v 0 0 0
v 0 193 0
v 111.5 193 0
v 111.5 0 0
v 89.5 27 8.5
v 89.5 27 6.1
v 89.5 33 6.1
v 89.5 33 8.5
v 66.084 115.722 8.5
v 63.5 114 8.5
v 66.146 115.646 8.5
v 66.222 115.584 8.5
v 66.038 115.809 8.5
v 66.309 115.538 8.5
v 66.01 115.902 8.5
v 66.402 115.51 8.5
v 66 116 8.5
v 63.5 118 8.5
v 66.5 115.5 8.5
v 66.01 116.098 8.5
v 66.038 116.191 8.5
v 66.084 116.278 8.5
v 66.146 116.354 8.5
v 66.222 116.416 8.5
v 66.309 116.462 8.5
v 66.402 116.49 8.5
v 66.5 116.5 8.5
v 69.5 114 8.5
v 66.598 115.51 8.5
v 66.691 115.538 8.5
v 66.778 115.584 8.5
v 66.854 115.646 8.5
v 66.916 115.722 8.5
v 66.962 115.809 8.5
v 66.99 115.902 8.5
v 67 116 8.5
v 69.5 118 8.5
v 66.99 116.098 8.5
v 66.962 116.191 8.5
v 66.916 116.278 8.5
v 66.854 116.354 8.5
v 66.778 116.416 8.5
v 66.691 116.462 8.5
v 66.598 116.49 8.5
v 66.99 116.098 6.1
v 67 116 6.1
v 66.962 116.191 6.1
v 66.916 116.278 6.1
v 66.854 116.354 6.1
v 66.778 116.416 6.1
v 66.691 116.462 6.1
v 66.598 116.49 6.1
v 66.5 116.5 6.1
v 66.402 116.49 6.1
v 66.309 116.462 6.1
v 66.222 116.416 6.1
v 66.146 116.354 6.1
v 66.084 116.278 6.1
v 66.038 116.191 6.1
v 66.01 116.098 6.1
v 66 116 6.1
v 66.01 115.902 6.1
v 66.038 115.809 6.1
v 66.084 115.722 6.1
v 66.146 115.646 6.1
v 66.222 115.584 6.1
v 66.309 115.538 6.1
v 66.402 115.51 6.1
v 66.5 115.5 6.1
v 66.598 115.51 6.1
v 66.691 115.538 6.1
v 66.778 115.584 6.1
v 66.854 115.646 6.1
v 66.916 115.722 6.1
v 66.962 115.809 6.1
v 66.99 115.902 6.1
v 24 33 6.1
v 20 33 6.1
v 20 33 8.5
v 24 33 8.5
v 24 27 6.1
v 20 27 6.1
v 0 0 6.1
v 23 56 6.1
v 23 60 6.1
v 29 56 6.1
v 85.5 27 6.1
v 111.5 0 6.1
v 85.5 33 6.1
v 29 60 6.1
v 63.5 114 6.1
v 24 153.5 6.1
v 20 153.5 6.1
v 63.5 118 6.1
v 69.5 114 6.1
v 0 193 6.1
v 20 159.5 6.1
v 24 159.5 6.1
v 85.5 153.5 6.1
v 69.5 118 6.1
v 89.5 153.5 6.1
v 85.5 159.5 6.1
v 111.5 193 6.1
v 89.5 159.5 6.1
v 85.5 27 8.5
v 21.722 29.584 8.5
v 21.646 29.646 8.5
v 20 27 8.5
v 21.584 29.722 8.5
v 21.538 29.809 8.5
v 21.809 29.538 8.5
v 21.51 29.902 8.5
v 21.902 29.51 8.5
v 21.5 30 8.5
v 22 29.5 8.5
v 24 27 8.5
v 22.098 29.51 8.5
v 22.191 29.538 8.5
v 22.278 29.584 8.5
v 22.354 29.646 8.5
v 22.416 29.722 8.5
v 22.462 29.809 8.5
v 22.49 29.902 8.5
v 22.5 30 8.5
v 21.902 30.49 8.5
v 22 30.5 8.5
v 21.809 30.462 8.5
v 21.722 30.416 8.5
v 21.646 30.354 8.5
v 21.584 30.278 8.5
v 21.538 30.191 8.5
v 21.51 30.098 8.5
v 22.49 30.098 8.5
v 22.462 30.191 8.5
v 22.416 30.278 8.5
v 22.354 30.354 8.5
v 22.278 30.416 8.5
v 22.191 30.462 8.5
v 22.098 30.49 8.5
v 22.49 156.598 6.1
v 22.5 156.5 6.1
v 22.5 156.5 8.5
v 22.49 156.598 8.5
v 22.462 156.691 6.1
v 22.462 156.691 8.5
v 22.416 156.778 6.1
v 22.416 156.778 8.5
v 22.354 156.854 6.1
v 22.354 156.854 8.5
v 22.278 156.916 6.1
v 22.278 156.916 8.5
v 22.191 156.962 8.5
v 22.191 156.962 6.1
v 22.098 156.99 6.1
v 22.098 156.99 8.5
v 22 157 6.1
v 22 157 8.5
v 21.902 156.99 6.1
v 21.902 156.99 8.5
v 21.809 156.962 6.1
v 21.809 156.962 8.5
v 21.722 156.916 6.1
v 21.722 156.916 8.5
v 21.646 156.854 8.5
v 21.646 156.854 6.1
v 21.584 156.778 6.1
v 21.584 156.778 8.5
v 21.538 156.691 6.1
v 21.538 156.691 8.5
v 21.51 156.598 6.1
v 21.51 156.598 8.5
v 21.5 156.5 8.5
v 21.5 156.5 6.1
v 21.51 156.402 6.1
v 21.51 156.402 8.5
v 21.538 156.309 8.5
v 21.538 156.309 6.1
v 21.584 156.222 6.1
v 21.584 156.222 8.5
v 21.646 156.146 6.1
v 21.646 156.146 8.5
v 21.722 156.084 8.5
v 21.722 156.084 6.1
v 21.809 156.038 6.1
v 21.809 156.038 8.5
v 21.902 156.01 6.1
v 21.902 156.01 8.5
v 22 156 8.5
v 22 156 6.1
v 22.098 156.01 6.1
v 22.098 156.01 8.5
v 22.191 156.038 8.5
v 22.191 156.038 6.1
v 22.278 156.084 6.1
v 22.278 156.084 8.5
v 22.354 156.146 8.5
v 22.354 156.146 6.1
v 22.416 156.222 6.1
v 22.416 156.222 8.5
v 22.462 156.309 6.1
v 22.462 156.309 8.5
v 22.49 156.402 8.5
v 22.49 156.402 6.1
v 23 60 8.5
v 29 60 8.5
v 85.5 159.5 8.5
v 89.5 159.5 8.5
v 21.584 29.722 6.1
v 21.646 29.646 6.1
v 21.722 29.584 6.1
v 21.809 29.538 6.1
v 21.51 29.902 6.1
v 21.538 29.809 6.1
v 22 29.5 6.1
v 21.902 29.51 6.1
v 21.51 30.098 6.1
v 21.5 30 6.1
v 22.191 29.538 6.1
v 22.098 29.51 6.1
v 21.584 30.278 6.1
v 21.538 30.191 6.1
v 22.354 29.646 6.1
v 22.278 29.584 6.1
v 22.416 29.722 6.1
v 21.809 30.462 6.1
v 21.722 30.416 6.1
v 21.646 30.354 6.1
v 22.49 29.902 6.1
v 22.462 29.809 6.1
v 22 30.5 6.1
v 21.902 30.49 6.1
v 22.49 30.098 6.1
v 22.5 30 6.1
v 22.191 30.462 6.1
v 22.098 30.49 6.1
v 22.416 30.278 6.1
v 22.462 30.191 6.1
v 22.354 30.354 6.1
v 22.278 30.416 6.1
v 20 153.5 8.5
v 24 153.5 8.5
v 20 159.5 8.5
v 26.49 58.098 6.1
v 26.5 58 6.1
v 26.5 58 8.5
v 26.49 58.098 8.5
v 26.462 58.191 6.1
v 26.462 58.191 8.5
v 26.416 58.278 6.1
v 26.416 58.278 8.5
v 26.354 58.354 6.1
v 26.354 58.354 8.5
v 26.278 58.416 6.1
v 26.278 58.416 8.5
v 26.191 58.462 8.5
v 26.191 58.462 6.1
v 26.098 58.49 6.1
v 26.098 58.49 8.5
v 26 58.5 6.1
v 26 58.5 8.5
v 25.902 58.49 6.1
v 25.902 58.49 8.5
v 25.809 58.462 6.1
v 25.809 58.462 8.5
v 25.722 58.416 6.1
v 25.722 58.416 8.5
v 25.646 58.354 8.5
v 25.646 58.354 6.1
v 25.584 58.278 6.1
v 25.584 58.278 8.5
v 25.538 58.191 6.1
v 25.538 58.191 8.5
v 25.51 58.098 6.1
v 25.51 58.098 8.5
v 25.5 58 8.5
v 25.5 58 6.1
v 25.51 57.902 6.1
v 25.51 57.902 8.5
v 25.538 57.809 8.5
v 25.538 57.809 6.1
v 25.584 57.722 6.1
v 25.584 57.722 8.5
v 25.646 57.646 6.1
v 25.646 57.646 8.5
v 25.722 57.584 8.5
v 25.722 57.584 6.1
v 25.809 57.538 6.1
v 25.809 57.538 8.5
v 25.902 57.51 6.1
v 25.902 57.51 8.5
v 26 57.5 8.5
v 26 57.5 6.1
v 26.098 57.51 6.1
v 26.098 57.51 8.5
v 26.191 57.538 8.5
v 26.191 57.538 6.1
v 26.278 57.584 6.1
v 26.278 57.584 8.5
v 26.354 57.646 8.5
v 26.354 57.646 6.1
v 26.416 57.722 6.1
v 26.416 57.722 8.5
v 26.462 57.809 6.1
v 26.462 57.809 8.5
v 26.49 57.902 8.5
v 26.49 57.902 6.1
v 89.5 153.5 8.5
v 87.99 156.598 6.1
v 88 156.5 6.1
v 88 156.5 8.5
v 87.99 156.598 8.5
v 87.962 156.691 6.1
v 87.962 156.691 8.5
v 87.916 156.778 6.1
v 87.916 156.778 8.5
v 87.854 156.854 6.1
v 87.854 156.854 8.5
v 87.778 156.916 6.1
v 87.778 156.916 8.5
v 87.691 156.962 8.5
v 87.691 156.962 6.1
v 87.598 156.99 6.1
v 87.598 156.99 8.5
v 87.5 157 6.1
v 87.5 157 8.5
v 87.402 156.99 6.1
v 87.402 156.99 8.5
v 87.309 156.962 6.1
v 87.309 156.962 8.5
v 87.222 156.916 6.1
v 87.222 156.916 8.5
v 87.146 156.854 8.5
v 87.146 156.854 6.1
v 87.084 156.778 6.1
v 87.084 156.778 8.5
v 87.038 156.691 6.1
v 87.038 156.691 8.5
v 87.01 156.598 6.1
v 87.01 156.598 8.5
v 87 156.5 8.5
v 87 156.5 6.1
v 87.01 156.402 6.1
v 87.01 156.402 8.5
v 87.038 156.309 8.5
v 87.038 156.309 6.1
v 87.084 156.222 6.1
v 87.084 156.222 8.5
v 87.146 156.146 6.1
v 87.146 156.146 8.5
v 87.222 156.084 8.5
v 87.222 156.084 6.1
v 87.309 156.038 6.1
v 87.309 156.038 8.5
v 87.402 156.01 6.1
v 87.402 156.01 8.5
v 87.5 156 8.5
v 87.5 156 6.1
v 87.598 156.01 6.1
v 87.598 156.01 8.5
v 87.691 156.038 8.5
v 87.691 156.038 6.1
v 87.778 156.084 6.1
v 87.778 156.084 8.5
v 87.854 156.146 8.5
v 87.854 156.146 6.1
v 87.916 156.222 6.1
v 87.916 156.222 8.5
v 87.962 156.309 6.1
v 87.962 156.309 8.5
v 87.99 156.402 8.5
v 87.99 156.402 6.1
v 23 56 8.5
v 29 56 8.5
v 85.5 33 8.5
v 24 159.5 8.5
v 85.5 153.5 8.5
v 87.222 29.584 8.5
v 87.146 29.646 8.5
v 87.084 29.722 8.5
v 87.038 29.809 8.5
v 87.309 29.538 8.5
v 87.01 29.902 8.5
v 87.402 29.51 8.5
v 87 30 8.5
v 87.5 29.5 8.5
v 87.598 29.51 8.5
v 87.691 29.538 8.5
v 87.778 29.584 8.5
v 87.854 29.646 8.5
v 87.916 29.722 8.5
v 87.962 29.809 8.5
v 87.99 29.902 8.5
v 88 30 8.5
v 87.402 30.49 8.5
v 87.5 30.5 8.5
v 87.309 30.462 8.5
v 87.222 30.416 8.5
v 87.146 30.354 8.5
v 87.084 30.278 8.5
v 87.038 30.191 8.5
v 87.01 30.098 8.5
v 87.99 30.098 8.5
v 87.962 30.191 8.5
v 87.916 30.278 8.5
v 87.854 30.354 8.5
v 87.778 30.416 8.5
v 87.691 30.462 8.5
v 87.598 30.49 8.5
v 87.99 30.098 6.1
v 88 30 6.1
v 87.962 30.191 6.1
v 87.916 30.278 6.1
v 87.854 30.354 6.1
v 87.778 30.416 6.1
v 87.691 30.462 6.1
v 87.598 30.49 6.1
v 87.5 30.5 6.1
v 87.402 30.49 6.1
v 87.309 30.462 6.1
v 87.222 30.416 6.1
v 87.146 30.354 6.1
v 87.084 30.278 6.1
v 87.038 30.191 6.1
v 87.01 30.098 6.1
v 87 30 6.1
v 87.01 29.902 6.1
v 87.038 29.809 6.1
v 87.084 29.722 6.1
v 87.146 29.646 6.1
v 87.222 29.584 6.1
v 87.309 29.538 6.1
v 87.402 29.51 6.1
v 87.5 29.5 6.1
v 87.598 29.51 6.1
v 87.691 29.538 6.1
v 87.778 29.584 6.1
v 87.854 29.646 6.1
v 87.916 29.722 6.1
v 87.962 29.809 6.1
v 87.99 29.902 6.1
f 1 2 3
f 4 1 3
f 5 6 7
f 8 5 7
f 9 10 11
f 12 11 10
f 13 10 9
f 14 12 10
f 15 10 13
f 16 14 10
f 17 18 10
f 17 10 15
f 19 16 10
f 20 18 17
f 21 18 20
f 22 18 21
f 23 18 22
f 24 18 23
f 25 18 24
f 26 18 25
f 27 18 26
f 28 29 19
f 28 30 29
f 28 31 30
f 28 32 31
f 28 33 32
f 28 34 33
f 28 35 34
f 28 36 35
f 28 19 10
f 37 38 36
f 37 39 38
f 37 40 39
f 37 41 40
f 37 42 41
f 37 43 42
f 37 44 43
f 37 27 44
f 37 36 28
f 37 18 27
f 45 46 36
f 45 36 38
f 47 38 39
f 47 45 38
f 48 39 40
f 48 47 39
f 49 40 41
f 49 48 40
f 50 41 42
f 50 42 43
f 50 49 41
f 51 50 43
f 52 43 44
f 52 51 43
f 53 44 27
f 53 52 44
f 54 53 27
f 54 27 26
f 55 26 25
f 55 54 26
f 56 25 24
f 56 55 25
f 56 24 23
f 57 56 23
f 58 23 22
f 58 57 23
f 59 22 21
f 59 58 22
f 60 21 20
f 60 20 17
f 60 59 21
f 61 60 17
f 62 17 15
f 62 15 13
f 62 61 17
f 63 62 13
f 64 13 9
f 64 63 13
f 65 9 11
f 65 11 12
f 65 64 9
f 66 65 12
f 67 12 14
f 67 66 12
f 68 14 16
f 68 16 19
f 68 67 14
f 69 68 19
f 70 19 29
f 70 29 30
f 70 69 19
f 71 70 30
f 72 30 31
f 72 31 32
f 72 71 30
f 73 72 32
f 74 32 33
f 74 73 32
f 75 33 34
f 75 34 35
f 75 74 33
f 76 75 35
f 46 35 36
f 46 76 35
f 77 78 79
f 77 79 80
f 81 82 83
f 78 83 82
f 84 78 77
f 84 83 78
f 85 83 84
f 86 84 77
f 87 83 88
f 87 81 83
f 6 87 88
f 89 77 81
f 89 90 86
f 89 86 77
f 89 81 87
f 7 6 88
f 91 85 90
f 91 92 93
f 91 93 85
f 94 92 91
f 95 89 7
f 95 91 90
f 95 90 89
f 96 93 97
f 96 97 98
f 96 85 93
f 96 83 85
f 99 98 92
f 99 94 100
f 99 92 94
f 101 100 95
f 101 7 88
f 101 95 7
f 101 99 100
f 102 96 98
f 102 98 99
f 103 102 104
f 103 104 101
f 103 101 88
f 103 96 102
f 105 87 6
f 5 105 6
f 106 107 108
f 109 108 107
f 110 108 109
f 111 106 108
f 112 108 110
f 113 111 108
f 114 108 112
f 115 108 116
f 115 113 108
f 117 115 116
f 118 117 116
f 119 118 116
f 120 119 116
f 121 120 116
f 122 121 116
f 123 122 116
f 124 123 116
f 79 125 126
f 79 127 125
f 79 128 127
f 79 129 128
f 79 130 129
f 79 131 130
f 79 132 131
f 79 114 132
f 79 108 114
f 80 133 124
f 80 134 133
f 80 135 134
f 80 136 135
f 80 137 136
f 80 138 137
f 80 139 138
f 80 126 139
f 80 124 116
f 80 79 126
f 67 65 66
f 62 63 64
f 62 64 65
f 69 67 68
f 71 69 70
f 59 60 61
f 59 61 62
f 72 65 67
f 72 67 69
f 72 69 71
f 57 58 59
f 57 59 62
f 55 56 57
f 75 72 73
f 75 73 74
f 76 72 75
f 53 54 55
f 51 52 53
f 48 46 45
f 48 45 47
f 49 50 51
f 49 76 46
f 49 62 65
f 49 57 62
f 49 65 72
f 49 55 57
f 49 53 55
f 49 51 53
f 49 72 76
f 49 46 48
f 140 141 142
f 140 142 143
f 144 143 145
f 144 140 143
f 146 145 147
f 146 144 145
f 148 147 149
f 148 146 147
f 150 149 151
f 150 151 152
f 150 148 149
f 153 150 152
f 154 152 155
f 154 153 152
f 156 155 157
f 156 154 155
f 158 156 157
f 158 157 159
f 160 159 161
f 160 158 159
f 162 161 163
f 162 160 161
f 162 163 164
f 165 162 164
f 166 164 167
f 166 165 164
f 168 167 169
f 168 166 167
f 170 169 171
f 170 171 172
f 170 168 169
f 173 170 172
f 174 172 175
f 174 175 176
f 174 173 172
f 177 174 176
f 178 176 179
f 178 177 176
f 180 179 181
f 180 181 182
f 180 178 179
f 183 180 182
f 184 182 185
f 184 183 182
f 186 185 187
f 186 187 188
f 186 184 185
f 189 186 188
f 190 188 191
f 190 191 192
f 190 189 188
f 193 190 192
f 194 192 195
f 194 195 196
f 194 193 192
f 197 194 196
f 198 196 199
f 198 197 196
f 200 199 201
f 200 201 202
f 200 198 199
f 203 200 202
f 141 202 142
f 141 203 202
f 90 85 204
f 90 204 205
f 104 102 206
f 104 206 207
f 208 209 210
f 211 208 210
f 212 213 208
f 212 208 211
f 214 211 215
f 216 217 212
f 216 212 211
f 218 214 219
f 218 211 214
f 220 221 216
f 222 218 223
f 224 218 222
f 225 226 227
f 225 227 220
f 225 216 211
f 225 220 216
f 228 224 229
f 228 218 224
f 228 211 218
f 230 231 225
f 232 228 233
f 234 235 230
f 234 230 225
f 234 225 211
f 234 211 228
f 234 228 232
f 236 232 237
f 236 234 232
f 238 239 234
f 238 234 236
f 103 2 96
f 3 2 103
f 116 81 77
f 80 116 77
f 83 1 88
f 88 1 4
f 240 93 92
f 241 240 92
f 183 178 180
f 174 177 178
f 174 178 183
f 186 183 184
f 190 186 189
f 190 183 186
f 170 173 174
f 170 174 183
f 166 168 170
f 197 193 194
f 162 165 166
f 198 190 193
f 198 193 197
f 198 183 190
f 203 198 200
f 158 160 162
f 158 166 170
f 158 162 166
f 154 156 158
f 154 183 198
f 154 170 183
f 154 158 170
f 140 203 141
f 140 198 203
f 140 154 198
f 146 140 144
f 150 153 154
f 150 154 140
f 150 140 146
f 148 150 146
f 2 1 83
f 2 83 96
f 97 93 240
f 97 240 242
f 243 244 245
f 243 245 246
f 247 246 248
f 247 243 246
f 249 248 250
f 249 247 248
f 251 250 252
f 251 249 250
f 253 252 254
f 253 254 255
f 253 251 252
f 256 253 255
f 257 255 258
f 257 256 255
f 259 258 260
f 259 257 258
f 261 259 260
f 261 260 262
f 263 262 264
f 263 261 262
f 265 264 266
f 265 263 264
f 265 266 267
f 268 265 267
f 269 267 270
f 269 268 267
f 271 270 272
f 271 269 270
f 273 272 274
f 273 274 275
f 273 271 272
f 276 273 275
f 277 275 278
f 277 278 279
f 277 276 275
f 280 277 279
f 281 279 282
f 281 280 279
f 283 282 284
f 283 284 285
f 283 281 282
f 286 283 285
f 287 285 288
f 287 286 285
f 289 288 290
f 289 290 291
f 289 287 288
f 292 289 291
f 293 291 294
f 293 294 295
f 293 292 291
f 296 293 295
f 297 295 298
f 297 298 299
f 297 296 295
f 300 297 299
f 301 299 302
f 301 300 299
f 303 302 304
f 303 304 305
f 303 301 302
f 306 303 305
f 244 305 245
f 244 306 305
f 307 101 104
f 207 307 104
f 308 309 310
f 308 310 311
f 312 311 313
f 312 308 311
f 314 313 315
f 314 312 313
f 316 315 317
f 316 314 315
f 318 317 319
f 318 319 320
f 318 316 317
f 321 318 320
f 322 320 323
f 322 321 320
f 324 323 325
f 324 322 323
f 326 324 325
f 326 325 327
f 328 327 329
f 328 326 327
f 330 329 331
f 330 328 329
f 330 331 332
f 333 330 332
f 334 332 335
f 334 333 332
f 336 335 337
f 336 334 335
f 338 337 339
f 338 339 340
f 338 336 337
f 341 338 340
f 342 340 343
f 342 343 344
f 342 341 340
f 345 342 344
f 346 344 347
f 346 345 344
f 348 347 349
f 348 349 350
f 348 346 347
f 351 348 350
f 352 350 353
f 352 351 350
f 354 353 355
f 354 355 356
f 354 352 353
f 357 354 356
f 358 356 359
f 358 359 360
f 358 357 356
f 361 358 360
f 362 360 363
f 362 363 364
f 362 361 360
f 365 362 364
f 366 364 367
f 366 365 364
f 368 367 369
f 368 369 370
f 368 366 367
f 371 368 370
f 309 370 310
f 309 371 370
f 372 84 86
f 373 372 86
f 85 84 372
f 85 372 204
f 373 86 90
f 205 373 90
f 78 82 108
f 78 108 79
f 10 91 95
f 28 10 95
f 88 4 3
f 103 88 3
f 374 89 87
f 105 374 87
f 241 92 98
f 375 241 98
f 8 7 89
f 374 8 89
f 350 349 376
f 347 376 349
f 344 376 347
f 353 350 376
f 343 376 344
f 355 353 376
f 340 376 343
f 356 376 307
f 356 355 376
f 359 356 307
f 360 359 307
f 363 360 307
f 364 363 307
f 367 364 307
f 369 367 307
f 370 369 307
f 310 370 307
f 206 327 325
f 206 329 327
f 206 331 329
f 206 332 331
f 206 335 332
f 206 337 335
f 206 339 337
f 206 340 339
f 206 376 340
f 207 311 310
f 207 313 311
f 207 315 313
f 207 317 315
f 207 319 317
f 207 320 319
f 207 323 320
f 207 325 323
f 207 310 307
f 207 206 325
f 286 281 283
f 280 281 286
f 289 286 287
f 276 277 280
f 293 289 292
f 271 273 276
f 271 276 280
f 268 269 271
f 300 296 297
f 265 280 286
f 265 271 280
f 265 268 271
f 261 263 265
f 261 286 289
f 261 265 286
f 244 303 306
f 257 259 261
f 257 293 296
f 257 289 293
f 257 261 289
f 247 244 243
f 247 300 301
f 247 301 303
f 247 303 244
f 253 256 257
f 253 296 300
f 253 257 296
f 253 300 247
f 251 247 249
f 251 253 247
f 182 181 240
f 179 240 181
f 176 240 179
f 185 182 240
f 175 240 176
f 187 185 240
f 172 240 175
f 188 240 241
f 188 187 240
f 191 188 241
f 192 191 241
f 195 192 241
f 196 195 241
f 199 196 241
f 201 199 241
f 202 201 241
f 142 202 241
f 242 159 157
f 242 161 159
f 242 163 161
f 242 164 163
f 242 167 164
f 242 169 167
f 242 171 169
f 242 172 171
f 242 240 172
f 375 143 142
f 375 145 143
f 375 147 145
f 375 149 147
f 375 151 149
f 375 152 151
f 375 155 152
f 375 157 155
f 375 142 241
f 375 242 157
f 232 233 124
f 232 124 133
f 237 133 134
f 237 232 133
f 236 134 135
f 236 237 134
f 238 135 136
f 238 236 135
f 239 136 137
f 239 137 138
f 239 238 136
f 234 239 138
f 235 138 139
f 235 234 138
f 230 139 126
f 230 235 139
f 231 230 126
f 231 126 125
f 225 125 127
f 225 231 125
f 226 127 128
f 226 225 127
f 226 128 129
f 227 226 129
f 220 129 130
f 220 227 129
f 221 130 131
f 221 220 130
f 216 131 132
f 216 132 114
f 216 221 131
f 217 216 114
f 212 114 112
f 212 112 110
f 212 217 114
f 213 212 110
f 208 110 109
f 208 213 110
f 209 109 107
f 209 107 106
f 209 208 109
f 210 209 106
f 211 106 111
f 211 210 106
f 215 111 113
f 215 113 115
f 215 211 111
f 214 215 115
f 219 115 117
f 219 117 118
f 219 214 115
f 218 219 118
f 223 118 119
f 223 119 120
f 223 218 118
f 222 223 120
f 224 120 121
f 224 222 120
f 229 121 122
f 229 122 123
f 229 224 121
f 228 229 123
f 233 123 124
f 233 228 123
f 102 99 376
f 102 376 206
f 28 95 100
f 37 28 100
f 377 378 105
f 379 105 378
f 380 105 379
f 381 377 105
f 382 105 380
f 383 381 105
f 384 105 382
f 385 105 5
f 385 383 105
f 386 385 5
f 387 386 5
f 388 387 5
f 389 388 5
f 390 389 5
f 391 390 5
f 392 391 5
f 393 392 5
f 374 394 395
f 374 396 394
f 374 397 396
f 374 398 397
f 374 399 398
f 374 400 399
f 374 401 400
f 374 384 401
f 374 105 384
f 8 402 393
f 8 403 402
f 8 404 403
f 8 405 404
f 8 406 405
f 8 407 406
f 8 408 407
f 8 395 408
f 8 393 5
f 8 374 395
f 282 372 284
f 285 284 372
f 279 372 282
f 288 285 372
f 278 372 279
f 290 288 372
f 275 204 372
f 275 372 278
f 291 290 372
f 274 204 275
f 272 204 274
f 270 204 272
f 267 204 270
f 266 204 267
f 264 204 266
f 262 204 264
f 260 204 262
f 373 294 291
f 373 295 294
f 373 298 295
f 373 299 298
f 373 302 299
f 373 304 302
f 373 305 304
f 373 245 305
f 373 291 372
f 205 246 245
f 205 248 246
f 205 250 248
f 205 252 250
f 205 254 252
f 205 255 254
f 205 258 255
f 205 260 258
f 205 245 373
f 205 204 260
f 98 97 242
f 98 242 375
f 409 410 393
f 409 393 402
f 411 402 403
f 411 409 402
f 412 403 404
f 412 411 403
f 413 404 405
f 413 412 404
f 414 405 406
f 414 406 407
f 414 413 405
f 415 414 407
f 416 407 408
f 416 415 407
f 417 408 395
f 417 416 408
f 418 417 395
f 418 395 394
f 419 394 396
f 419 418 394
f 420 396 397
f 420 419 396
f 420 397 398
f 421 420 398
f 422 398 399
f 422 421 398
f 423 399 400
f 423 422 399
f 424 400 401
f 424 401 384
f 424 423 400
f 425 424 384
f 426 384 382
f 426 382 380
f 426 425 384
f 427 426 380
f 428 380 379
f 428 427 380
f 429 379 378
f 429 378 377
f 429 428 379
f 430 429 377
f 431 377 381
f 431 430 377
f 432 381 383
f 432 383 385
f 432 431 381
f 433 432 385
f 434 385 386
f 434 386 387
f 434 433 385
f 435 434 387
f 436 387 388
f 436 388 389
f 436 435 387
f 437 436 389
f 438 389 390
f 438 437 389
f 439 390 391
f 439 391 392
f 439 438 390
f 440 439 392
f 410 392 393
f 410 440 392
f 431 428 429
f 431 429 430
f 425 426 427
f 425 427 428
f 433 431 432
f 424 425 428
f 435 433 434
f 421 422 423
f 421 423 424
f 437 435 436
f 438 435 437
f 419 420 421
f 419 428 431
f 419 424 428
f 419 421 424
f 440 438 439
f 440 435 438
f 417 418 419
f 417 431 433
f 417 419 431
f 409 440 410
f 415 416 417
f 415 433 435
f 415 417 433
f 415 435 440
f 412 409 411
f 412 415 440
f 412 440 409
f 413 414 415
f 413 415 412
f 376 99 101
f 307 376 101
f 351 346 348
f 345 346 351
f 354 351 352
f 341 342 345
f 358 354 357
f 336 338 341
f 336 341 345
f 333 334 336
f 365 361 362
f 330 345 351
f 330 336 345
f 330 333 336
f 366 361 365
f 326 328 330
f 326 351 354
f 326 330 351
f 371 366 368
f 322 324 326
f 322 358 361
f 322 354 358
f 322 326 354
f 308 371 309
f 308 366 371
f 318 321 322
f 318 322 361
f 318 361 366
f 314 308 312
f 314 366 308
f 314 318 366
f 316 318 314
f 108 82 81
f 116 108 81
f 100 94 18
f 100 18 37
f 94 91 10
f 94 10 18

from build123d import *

# Parameters (mm, degrees)
SKETCH1_W           = 111.5
SKETCH1_H           = 193
BOSS_EXTRUDE1_DEPTH = 6.1
SKETCH2_W           = 4
SKETCH2_H           = 6
SKETCH2_R           = 0.5
SKETCH2_W_2         = 6
SKETCH2_H_2         = 4
BOSS_EXTRUDE2_DEPTH = 2.4


with BuildPart() as part:
    # Sketch1 → Boss-Extrude1 (new body)
    with BuildSketch(Plane.XY):
        with Locations((55.75, 96.5)):
            Rectangle(SKETCH1_W, SKETCH1_H)
    extrude(amount=BOSS_EXTRUDE1_DEPTH)

    # Sketch2 → Boss-Extrude2 (add)
    with BuildSketch(Plane.XY.offset(6.1)):
        with Locations((22, 156.5)):
            Rectangle(SKETCH2_W, SKETCH2_H)
        with Locations((22, 156.5)):
            Circle(SKETCH2_R, mode=Mode.SUBTRACT)
        Polygon((87.5, 33), (85.5, 33), (85.5, 27), (89.5, 27), (89.5, 33), align=None)
        with Locations((87.5, 30)):
            Circle(SKETCH2_R, mode=Mode.SUBTRACT)
        with Locations((22, 30)):
            Rectangle(SKETCH2_W, SKETCH2_H)
        with Locations((22, 30)):
            Circle(SKETCH2_R, mode=Mode.SUBTRACT)
        with Locations((87.5, 156.5)):
            Rectangle(SKETCH2_W, SKETCH2_H)
        with Locations((87.5, 156.5)):
            Circle(SKETCH2_R, mode=Mode.SUBTRACT)
        with Locations((26, 58)):
            Rectangle(SKETCH2_W_2, SKETCH2_H_2)
        with Locations((26, 58)):
            Circle(SKETCH2_R, mode=Mode.SUBTRACT)
        with Locations((66.5, 116)):
            Rectangle(SKETCH2_W_2, SKETCH2_H_2)
        with Locations((66.5, 116)):
            Circle(SKETCH2_R, mode=Mode.SUBTRACT)
    extrude(amount=BOSS_EXTRUDE2_DEPTH)


solid = part.part
